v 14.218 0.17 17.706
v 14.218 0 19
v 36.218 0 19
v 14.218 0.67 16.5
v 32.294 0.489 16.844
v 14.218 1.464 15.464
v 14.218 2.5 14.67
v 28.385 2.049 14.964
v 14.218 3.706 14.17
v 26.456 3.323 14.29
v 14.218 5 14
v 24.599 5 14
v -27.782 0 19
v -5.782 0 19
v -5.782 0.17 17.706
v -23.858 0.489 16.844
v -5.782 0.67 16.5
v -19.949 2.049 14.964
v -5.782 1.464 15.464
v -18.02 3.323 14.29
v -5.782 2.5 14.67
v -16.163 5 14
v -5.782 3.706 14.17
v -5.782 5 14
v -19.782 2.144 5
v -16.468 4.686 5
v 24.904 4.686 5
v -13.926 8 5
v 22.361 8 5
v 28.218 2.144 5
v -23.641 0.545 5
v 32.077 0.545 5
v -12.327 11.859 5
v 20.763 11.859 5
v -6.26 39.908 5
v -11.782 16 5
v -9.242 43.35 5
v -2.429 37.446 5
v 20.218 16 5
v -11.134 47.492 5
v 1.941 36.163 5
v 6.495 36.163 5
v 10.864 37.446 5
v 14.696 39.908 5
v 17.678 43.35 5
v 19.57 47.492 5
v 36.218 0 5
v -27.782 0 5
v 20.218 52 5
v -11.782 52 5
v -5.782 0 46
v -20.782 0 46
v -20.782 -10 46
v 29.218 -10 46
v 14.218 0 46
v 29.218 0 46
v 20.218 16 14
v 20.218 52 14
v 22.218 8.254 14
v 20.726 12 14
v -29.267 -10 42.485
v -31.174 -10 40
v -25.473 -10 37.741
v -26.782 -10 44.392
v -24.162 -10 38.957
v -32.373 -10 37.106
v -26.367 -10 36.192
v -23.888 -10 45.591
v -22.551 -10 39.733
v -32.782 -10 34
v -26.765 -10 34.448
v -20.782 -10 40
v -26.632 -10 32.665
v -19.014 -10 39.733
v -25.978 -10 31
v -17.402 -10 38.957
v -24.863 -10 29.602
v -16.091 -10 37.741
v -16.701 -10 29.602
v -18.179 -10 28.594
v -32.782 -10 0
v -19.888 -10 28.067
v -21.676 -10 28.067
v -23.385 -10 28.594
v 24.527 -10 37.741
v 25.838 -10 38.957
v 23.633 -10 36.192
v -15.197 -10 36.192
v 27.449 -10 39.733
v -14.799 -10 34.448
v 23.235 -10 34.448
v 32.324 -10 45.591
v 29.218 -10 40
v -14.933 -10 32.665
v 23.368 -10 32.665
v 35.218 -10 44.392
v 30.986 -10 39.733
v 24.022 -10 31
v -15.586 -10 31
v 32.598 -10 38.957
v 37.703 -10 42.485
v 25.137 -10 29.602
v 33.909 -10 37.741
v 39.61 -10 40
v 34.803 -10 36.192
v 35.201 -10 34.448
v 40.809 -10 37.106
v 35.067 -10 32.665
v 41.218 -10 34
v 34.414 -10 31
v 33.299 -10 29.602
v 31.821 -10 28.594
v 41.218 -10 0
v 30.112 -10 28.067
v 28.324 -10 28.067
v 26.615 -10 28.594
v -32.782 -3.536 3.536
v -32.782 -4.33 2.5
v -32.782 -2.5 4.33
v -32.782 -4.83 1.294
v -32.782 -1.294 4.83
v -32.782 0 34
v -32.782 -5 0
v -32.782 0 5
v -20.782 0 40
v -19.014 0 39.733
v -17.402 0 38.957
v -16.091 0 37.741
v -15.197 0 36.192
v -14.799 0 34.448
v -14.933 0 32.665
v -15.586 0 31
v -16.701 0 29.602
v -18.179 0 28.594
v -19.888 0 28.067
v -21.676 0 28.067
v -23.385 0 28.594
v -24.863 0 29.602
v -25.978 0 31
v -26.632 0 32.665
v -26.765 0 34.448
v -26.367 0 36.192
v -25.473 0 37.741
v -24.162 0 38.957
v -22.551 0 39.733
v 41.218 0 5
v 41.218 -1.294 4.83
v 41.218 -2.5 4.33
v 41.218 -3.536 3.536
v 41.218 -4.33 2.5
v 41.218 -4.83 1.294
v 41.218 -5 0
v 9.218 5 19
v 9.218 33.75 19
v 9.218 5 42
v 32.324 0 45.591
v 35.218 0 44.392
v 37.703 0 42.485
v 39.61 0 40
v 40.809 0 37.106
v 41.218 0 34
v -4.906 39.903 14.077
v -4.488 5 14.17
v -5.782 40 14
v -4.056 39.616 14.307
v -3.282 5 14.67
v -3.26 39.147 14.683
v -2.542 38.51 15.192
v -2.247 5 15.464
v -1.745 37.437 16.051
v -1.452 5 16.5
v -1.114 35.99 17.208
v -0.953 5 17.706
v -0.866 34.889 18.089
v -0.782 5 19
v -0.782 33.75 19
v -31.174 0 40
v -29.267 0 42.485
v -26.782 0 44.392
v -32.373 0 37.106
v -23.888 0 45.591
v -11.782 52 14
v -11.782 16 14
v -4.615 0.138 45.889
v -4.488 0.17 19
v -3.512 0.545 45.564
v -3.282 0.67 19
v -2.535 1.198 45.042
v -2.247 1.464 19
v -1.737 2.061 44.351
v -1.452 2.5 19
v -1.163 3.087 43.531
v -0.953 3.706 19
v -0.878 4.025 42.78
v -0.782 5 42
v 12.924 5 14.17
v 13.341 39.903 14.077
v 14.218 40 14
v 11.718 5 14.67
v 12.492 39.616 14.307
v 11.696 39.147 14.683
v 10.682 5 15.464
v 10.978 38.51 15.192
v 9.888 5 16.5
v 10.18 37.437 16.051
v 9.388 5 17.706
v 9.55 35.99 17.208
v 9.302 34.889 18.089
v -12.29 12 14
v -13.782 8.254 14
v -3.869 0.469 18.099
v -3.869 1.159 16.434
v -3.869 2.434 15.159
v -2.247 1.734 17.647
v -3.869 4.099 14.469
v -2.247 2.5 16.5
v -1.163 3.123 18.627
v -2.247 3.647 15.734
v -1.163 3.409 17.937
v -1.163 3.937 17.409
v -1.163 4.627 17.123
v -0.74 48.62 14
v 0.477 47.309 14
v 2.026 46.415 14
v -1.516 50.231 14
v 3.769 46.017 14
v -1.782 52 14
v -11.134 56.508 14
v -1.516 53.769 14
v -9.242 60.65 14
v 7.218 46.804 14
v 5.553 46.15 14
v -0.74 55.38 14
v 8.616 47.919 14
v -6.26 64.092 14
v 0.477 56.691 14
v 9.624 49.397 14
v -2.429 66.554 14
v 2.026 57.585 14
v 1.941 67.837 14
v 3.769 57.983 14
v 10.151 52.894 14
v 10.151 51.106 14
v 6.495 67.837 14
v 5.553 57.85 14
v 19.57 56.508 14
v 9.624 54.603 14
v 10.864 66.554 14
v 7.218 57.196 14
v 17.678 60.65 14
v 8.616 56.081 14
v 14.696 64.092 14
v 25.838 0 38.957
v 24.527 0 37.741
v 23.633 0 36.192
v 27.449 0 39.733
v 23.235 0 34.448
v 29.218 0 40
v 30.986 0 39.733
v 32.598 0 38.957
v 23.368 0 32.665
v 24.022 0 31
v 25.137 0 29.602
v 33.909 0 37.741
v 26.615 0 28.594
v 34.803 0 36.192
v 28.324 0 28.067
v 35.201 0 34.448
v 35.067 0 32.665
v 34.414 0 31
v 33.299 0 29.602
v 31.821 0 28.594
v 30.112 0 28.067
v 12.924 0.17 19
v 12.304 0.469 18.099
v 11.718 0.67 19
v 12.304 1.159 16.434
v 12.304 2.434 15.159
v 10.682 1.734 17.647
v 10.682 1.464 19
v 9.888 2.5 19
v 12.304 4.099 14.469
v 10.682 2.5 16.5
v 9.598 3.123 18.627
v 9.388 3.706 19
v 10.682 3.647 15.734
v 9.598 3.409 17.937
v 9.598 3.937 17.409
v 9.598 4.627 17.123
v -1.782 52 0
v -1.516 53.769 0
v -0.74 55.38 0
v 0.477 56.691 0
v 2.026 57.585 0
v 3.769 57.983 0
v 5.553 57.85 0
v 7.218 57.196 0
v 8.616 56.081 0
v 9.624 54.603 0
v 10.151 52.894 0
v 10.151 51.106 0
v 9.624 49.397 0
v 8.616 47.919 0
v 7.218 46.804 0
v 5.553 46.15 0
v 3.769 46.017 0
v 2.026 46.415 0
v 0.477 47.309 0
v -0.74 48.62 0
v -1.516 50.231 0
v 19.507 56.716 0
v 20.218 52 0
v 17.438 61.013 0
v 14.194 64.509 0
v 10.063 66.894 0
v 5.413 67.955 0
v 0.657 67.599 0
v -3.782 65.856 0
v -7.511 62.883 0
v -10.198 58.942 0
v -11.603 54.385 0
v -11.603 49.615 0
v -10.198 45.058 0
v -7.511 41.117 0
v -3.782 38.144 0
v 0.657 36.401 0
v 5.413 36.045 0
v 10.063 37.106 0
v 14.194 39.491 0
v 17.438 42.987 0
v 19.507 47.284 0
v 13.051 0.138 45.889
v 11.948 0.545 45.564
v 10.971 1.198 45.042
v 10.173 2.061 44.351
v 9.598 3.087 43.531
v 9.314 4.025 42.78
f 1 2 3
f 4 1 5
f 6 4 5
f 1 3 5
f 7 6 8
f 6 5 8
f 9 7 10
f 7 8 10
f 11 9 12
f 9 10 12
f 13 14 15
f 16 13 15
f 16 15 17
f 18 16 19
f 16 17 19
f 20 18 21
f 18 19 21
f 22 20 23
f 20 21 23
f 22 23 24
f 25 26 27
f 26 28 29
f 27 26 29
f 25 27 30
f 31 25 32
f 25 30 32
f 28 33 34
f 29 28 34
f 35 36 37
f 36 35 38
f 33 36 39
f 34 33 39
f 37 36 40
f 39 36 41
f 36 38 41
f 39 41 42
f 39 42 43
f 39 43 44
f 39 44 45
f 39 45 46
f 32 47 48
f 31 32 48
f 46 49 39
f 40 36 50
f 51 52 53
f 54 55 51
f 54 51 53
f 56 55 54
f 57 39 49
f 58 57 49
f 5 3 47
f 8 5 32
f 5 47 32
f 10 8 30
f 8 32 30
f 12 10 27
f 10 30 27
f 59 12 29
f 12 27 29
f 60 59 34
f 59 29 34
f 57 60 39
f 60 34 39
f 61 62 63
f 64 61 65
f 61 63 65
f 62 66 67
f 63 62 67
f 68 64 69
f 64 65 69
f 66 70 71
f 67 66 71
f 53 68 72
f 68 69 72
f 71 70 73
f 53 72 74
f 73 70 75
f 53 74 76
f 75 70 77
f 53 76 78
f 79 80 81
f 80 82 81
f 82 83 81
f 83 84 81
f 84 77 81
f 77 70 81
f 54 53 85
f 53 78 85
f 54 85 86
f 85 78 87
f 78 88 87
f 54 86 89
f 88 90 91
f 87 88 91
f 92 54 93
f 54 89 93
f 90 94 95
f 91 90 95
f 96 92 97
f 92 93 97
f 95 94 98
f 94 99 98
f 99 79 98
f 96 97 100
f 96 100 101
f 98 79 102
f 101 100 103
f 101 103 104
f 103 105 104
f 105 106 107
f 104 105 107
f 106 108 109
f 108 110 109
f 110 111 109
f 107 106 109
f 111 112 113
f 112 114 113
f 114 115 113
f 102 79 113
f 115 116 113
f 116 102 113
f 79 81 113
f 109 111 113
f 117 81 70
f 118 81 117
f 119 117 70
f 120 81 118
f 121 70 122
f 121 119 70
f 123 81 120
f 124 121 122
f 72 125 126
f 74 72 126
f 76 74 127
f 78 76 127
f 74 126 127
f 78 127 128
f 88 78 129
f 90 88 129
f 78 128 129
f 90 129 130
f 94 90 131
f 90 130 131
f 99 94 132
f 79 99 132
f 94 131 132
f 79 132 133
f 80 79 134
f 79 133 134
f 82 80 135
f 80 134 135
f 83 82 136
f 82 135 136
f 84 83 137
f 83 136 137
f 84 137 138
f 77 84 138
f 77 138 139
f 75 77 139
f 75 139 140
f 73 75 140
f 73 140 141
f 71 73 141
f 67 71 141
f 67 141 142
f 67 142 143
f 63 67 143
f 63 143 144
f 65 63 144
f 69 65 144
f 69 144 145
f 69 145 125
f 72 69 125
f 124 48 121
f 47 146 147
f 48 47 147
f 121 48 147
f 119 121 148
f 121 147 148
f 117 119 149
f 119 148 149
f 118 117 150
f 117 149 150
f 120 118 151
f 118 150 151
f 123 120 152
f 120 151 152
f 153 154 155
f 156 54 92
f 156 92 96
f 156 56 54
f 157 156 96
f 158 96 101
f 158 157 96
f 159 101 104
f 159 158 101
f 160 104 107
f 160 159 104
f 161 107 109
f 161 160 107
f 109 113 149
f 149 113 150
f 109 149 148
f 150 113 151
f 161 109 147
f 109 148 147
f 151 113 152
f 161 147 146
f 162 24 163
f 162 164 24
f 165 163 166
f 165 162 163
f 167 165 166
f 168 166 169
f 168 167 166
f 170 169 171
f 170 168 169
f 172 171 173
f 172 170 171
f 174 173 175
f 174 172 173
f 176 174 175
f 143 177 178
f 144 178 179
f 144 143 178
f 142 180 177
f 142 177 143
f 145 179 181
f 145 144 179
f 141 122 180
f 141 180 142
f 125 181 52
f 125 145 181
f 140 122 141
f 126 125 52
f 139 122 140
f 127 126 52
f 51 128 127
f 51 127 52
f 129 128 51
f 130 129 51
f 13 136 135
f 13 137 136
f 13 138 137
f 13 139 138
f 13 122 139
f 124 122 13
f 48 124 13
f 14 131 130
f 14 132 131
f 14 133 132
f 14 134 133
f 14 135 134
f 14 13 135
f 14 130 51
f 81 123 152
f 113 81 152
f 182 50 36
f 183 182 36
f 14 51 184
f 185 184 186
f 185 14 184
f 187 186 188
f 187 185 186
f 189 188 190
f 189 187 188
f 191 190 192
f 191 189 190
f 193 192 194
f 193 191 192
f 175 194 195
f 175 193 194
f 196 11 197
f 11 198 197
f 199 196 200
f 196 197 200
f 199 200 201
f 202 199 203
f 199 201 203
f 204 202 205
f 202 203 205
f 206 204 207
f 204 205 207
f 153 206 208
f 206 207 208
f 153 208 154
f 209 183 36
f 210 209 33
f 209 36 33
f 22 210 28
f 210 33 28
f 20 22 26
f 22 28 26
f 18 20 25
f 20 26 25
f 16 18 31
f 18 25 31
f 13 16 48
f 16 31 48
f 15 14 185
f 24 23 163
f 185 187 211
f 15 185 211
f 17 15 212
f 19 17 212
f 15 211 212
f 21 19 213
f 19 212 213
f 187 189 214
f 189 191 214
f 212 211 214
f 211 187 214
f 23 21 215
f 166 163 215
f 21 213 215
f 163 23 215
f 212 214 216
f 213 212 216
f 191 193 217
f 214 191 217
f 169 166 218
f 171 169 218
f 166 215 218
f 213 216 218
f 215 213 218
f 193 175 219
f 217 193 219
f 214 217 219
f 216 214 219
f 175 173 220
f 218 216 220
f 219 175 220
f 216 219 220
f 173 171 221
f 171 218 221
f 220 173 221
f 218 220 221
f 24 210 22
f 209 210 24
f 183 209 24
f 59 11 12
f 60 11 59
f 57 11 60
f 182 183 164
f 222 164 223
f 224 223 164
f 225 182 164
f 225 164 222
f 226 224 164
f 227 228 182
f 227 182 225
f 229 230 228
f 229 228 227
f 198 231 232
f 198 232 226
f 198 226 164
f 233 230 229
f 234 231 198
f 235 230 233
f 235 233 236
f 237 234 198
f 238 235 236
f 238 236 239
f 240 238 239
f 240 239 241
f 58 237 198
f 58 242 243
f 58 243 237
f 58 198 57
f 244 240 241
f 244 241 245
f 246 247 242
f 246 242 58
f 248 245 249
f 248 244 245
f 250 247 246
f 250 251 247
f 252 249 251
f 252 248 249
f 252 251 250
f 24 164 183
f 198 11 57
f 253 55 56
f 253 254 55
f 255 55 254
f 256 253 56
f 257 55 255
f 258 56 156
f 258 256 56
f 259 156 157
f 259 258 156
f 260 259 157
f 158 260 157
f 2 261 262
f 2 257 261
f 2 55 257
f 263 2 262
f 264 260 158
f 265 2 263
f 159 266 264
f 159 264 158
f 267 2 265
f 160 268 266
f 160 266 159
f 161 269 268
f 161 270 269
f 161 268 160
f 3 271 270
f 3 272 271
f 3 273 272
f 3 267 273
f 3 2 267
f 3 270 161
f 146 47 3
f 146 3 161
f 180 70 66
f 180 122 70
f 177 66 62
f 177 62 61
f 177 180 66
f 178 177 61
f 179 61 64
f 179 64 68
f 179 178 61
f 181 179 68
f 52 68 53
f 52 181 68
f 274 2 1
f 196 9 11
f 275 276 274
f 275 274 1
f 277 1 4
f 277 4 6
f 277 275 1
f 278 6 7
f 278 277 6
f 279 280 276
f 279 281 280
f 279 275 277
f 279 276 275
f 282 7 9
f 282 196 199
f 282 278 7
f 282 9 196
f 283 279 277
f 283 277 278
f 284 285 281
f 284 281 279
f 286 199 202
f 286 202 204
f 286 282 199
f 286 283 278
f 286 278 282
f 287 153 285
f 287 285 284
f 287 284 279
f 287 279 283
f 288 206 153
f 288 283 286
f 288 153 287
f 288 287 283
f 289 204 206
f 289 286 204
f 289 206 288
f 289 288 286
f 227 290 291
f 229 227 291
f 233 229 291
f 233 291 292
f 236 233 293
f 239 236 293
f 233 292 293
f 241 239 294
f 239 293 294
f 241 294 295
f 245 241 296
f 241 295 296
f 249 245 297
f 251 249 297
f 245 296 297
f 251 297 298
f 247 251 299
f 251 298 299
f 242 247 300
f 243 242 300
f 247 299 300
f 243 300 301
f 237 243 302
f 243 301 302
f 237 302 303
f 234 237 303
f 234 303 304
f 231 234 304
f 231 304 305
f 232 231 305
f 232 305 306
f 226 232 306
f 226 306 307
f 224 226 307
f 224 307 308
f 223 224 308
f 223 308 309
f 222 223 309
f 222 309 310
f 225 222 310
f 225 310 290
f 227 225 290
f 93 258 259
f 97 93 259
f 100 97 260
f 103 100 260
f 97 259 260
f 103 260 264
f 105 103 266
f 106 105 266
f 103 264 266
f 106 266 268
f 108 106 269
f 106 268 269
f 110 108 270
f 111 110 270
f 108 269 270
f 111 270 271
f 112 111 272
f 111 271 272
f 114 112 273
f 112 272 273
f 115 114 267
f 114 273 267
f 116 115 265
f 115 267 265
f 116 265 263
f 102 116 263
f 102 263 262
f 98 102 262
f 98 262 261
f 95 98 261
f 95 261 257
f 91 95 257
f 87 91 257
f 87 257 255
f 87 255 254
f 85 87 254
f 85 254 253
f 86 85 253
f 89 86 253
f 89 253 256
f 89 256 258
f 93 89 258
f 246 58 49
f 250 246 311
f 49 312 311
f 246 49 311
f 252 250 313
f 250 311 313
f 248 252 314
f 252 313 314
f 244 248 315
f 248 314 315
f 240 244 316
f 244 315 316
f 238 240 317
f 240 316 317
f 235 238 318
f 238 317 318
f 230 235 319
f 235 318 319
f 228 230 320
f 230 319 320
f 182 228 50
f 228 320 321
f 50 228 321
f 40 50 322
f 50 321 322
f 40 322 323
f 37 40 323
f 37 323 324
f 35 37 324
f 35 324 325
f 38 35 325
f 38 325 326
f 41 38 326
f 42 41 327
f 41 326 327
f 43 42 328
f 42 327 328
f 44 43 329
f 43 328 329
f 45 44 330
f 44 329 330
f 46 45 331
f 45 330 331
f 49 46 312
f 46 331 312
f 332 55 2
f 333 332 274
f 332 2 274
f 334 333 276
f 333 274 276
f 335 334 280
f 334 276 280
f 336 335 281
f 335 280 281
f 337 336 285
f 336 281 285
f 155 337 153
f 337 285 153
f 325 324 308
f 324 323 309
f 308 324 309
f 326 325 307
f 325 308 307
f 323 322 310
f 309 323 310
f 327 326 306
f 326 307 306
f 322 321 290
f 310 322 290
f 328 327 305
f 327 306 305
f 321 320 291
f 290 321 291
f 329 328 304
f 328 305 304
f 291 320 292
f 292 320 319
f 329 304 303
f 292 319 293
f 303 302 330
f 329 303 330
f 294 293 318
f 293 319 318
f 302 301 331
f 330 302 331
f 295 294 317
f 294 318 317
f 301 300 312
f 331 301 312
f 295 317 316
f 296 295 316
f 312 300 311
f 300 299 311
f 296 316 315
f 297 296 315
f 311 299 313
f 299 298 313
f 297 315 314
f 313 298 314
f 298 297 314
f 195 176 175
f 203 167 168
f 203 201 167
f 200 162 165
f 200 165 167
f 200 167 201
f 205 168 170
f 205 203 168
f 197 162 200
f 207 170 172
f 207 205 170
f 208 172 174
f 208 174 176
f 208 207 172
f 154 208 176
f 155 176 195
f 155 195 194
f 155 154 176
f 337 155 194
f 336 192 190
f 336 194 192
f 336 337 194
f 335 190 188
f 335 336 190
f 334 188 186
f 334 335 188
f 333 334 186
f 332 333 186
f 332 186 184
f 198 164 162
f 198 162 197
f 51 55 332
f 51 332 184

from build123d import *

# Parameters (mm, degrees)
SKETCH8_W               = 74
SKETCH8_H               = 10
BOSS_EXTRUDE9_DEPTH     = 46
FILLET8_R               = 12
FILLET9_R               = 12
CUT_EXTRUDE3_DEPTH      = 88.704047797
CUT_EXTRUDE3_DEPTH_BACK = 88.704047797
SKETCH13_R              = 6
BOSS_EXTRUDE10_DEPTH    = 14
CUT_EXTRUDE4_REACH      = 99.719
SKETCH15_W              = 5
SKETCH15_H              = 52
SKETCH26_R              = 16
BOSS_EXTRUDE11_DEPTH    = 14
FILLET11_R              = 5
FILLET12_START          = 5
FILLET12_DEPTH          = 14
FILLET12_START_2        = -27.782193151
FILLET12_2_DEPTH        = 64.0000001
SKETCH28_R              = 6
CUT_EXTRUDE5_DEPTH      = 92.863527091
RIB2_REACH              = 92.05
SKETCH31_WALL_W         = 233.324966138
SKETCH31_WALL_H         = 10
FILLET13_R              = 5
SKETCH36_R              = 6
CUT_EXTRUDE6_DEPTH      = 92.863527091


with BuildPart() as part:
    # Sketch8 → Boss-Extrude9 (new body)
    with BuildSketch(Plane.XY):
        with Locations((4.217806949, -5)):
            Rectangle(SKETCH8_W, SKETCH8_H)
    extrude(amount=BOSS_EXTRUDE9_DEPTH)

    # Fillet8
    fillet8_edges = [part.edges().sort_by_distance(p)[0] for p in [
        (-32.782193051, -5, 46),
    ]]
    fillet(fillet8_edges, radius=FILLET8_R)

    # Fillet9
    fillet9_edges = [part.edges().sort_by_distance(p)[0] for p in [
        (41.217806949, -5, 46),
    ]]
    fillet(fillet9_edges, radius=FILLET9_R)

    # Sketch10 → Cut-Extrude3 (cut, two sides: drawn at the far end of the back side and taken through both)
    with BuildSketch(Plane.ZY.offset(32.782193051).offset(-CUT_EXTRUDE3_DEPTH_BACK)):
        with BuildLine():
            Line((5, 102.54188241), (5, 0))
            ThreePointArc((5, 0), (3.535533906, -3.535533906), (0, -5))
            Line((0, -5), (-102.54188241, -5))
            Line((-102.54188241, -5), (-247.558003226, 140.016120816))
            Line((-247.558003226, 140.016120816), (-140.016120816, 247.558003226))
            Line((-140.016120816, 247.558003226), (5, 102.54188241))
        make_face()
    extrude(amount=CUT_EXTRUDE3_DEPTH + CUT_EXTRUDE3_DEPTH_BACK, mode=Mode.SUBTRACT)

    # Sketch13 → Boss-Extrude10 (add)
    with BuildSketch(Plane.XY):
        with BuildLine():
            Line((-11.782193051, 0), (20.217806949, 0))
            Line((20.217806949, 0), (20.217806949, 52))
            ThreePointArc((20.217806949, 52), (4.217806949, 68), (-11.782193051, 52))
            Line((-11.782193051, 52), (-11.782193051, 0))
        make_face()
        with Locations((4.217806949, 52)):
            Circle(SKETCH13_R, mode=Mode.SUBTRACT)
    extrude(amount=BOSS_EXTRUDE10_DEPTH)

    # Sketch15 → Cut-Extrude4 (cut, up to next)
    with BuildSketch(Plane.ZY.offset(11.782193051), mode=Mode.PRIVATE) as cut_extrude4_sk1:
        with Locations((2.5, 26)):
            Rectangle(SKETCH15_W, SKETCH15_H)
    cut_extrude4_tool1 = extrude(cut_extrude4_sk1.sketch, amount=-CUT_EXTRUDE4_REACH, mode=Mode.PRIVATE) & part.part
    add(cut_extrude4_tool1.solids().sort_by_distance((-11.782193, 26, 2.5))[0], mode=Mode.SUBTRACT)

    # Sketch26 → Boss-Extrude11 (add)
    with BuildSketch(Plane(origin=(0, 0, 0), x_dir=(-1, 0, 0), z_dir=(0, 0, -1))):
        with Locations((-4.217806949, 52)):
            Circle(SKETCH26_R)
    extrude(amount=-BOSS_EXTRUDE11_DEPTH)

    # Fillet11
    fillet11_edges = [part.edges().sort_by_distance(p)[0] for p in [
        (4.217806949, 0, 14),
    ]]
    fillet(fillet11_edges, radius=FILLET11_R)

    # Fillet12: read off the stored shape, not the designer's step
    # Fillet12 outline → Fillet12 (add)
    with BuildSketch(Plane.XY.offset(FILLET12_START)):
        with BuildLine():
            Line((-11.782193051, 0), (-11.782193051, 16))
            ThreePointArc((-11.782193051, 16), (-16.468484552, 4.686291501), (-27.782193051, 0))
            Line((-27.782193051, 0), (-11.782193051, 0))
        make_face()
        with BuildLine():
            Line((20.217806949, 16), (20.217806949, 0))
            Line((20.217806949, 0), (36.217806949, 0))
            ThreePointArc((36.217806949, 0), (24.90409845, 4.686291501), (20.217806949, 16))
        make_face()
    extrude(amount=FILLET12_DEPTH)

    # Fillet12 2 outline → Fillet12 2 (cut)
    with BuildSketch(Plane.YZ.offset(FILLET12_START_2)):
        with BuildLine():
            Line((16, 19), (0, 19))
            ThreePointArc((0, 19), (1.464466094, 15.464466094), (5, 14))
            Line((5, 14), (16, 14))
            Line((16, 14), (16, 19))
        make_face()
    extrude(amount=FILLET12_2_DEPTH, mode=Mode.SUBTRACT)

    # Sketch28 → Cut-Extrude5 (cut, through all)
    with BuildSketch(Plane(origin=(0, 0, 0), x_dir=(-1, 0, 0), z_dir=(0, 0, -1))):
        with Locations((-4.217806949, 52)):
            Circle(SKETCH28_R)
    extrude(amount=-CUT_EXTRUDE5_DEPTH, mode=Mode.SUBTRACT)

    # Sketch31 wall → Rib2 (add, up to next)
    with BuildSketch(Plane(origin=(4.217806949, 20, 30), x_dir=(0, -0.780868809443, 0.624695047554), z_dir=(0, 0.624695047554, 0.780868809443)), mode=Mode.PRIVATE) as rib2_sk1:
        Rectangle(SKETCH31_WALL_W, SKETCH31_WALL_H)
    rib2_tool1 = extrude(rib2_sk1.sketch, amount=-RIB2_REACH, mode=Mode.PRIVATE) - part.part
    add(rib2_tool1.solids().sort_by_distance((4.217806949, 20, 30))[0])

    # Fillet13
    fillet13_edges = [part.edges().sort_by_distance(p)[0] for p in [
        (-0.782193051, 0, 32.5),
        (-0.782193051, 1.464466094, 15.464466094),
        (-0.782193051, 22.5, 14),
        (9.217806949, 1.464466094, 15.464466094),
        (9.217806949, 22.5, 14),
        (9.217806949, 0, 32.5),
    ]]
    fillet(fillet13_edges, radius=FILLET13_R)

    # Sketch36 → Cut-Extrude6 (cut, through all)
    with BuildSketch(Plane(origin=(0, 0, 0), x_dir=(1, 0, 0), z_dir=(0, 1, 0))):
        with Locations(Location((-20.782193051, -34, 0), (0, 0, 270))):
            Circle(SKETCH36_R)
        with Locations(Location((29.217806949, -34, 0), (0, 0, 270))):
            Circle(SKETCH36_R)
    extrude(amount=-CUT_EXTRUDE6_DEPTH, mode=Mode.SUBTRACT)


solid = part.part
